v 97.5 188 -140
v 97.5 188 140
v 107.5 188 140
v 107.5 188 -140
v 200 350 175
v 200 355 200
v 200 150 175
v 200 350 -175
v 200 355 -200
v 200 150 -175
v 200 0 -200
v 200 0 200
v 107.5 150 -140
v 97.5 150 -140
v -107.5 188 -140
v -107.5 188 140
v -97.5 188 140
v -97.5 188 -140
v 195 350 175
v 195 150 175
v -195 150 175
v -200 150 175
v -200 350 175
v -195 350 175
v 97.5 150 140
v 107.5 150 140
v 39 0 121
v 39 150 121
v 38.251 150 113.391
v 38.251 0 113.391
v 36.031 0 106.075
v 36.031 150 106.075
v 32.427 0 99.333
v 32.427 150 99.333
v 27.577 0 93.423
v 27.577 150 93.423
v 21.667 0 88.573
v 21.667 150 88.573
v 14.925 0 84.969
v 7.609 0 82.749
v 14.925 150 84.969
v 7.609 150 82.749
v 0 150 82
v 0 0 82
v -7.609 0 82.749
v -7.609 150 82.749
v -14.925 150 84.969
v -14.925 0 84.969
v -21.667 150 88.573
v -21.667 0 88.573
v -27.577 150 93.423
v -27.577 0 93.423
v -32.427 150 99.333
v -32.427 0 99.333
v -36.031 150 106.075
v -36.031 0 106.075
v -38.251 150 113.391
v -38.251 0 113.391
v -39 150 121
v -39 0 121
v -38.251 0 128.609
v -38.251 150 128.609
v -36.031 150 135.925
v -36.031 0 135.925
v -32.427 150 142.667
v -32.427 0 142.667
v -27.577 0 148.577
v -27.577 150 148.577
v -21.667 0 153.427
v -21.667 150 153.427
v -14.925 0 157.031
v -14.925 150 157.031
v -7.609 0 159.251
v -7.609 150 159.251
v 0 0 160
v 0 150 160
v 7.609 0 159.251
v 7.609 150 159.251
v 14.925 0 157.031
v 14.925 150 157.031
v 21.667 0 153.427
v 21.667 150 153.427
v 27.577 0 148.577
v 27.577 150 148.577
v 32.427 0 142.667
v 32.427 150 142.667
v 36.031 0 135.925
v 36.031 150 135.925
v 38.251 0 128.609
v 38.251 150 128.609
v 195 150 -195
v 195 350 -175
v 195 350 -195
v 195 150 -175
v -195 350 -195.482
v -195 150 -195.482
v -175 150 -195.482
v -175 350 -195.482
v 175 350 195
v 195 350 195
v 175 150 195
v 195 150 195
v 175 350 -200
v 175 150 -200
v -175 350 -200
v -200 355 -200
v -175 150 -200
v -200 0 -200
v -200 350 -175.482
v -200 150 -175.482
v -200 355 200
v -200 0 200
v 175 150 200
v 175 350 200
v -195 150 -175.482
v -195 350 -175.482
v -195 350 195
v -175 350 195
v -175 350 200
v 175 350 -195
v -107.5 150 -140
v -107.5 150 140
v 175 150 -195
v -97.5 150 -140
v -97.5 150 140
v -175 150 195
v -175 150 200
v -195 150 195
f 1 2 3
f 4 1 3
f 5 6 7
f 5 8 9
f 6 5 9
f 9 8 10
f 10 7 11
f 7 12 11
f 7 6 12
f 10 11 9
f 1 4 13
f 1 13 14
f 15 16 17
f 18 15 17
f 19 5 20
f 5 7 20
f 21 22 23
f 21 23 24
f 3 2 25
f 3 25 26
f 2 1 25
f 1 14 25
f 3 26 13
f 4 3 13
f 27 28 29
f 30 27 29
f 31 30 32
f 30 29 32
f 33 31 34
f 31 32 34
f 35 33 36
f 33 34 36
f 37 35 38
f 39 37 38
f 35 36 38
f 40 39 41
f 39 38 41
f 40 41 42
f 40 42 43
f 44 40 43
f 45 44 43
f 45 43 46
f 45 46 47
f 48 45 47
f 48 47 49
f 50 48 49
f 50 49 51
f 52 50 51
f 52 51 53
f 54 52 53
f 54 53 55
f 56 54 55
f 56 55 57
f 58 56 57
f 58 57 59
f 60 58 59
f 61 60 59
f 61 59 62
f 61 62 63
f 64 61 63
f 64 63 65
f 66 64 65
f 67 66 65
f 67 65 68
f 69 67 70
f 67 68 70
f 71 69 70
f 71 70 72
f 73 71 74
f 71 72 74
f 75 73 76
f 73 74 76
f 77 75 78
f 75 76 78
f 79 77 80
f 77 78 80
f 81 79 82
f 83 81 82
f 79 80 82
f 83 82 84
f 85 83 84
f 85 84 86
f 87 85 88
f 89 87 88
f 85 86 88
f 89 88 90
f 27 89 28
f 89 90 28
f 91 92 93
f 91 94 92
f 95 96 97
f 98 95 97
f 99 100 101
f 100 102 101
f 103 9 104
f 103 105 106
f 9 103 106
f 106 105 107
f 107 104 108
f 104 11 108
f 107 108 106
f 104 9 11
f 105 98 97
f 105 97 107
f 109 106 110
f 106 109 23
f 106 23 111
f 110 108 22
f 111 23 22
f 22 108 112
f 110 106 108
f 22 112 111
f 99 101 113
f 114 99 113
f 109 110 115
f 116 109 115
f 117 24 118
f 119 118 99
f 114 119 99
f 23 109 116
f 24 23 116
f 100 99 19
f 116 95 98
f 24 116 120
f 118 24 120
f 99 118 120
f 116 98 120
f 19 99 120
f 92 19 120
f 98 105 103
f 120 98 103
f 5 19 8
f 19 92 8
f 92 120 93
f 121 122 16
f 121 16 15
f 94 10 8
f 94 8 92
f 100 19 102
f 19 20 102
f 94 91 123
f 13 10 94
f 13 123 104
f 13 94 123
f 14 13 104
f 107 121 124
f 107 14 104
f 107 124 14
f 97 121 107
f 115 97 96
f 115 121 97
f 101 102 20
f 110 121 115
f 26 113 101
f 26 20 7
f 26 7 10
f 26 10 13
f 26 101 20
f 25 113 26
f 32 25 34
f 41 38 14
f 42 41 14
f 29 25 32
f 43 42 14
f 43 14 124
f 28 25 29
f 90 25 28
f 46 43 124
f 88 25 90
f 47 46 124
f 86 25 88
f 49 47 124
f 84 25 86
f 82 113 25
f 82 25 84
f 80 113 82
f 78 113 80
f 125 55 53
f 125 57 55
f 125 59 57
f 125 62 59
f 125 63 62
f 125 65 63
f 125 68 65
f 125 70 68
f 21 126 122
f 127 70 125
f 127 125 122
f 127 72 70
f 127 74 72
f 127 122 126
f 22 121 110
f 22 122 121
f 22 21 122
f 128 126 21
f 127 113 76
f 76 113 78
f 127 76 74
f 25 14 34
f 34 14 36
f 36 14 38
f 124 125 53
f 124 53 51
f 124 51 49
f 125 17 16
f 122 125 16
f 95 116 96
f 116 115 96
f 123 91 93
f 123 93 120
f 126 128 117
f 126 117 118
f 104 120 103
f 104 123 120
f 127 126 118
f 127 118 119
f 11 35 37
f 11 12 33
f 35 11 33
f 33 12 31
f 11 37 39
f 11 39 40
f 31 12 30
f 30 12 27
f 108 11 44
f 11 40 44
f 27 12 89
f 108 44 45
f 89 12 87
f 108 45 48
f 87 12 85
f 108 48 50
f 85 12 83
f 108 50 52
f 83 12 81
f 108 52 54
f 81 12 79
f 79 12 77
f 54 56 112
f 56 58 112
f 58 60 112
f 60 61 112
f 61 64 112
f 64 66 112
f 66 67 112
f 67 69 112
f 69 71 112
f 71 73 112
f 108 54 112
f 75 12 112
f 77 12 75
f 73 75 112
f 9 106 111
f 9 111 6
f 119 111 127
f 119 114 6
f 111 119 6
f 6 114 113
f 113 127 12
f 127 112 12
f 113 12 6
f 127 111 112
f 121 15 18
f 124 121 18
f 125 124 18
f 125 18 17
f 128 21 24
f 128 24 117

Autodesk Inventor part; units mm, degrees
ref_plane "YZ Plane" through (0, 0, 0) normal (1, 0, 0) x (0, 1, 0)
ref_plane "XZ Plane" through (0, 0, 0) normal (0, 1, 0) x (-1, 0, 0)
ref_plane "XY Plane" through (0, 0, 0) normal (0, 0, 1) x (1, 0, 0)
sketch "Boceto1" plane through (0, 0, 0) normal (0, 1, 0) x (-1, 0, 0)
  line L0 (200, 200) -> (-200, 200)
  line L1 (-200, 200) -> (-200, -200)
  line L2 (-200, -200) -> (200, -200)
  line L3 (200, -200) -> (200, 200)
  point P0 (0, 0)
  dimension "d0" = 400
  dimension "L" = 400
  dimension "d2" = 200
  dimension "d3" = 200
extrude "Extrusión1" add sketch "Boceto1" along normal blind 150
sketch "Boceto3" plane through (0, 150, 0) normal (0, 1, 0) x (1, 0, 0)
  circle A0 centre (0, -121) radius 39
  line L0 (200, 200) -> (-200, 200) projected
  line L1 (-200, -200) -> (200, -200) projected
  point P0 (0, 0)
  dimension "D" = 78
  dimension "d27" = 79
extrude "Extrusión2" cut sketch "Boceto3" against normal blind 153.75
ref_plane "Plano de trabajo1" through (0, 0, 200) normal (1, 0, 0) x (0, 0, -1)
ref_plane "Plano de trabajo2" through (-200, 0, 0) normal (0, 0, 1) x (1, 0, 0)
sketch "Boceto4" plane through (0, 150, 0) normal (0, 1, 0) x (1, 0, 0)
  line L0 (-97.5, 140) -> (-97.5, -140)
  line L1 (97.5, 140) -> (97.5, -140)
  line L2 (200, 200) -> (-200, 200) projected
  circle A0 centre (0, -121) radius 39 projected
  line L3 (-200, -200) -> (200, -200) projected
  line L4 (-97.5, -140) -> (-107.5, -140)
  line L5 (-107.5, -140) -> (-107.5, 140)
  line L6 (-107.5, 140) -> (-97.5, 140)
  line L7 (-97.5, 140) -> (-97.5, -140)
  line L8 (97.5, -140) -> (107.5, -140)
  line L9 (107.5, -140) -> (107.5, 140)
  line L10 (107.5, 140) -> (97.5, 140)
  line L11 (97.5, 140) -> (97.5, -140)
  point P0 (0, 0)
  dimension "Lriel" = 280
  dimension "d13" = 60
  dimension "d14" = 280
  dimension "d15" = 60
  dimension "d19" = 10
  dimension "d20" = 280
  dimension "d21" = 97.5
  dimension "d22" = 10
  dimension "d23" = 280
  dimension "d24" = 97.5
extrude "Extrusión3" add sketch "Boceto4" along normal blind 38 contours L0 L4 L5 L6 | L10 L9 L8 L1
sketch "Boceto5" plane through (0, 150, 0) normal (0, 1, 0) x (1, 0, 0)
  line L0 (-200, 200) -> (-200, -200) projected
  line L1 (-200, 200) -> (-200, 175)
  line L2 (-200, 175.482) -> (-195, 175.482)
  line L3 (-195, 175.482) -> (-195, 195.482)
  line L4 (-195, 195.482) -> (-175, 195.482)
  line L5 (-175, 195.482) -> (-175, 200)
  line L6 (200, 200) -> (-200, 200) projected
  line L7 (-200, 200) -> (-175, 200)
  line L8 (-200, -200) -> (-200, -175)
  line L9 (-200, -175) -> (-195, -175)
  line L10 (-195, -175) -> (-195, -195)
  line L11 (-195, -195) -> (-175, -195)
  line L12 (-175, -195) -> (-175, -200)
  line L13 (-200, -200) -> (200, -200) projected
  line L14 (-175, -200) -> (-200, -200)
  line L15 (200, -200) -> (200, 200) projected
  line L16 (200, -200) -> (200, -175)
  line L17 (200, -175) -> (195, -175)
  line L18 (195, -175) -> (195, -195)
  line L19 (195, -195) -> (175, -195)
  line L20 (175, -195) -> (175, -200)
  line L21 (200, -200) -> (175, -200)
  line L22 (200, 200) -> (200, 175)
  line L23 (200, 175) -> (195, 175)
  line L24 (195, 175) -> (195, 195)
  line L25 (195, 195) -> (175, 195)
  line L26 (175, 195) -> (175, 200)
  line L27 (200, 200) -> (175, 200)
  point P0 (0, 0)
  dimension "d28" = 25
  dimension "d29" = 5
  dimension "d30" = 20
  dimension "d31" = 20
  dimension "d32" = 25
  dimension "d33" = 5
  dimension "d34" = 20
  dimension "d35" = 20
  dimension "d36" = 25
  dimension "d37" = 5
  dimension "d38" = 20
  dimension "d39" = 20
  dimension "d40" = 25
  dimension "d41" = 5
  dimension "d42" = 20
  dimension "d43" = 20
extrude "Extrusión4" add sketch "Boceto5" along normal blind 200 contours L6 L5 L4 L3 L2 L0 | L6 L15 L23 L24 L25 L26 | L9 L10 L11 L12 L13 L0 | L15 L13 L20 L19 L18 L17
sketch "Boceto6" plane through (0, 350, 0) normal (0, 1, 0) x (1, 0, 0)
  line L0 (-200, 200) -> (-200, -200) projected
  line L1 (-200, -200) -> (200, -200)
  line L2 (200, -200) -> (200, 200)
  line L3 (200, 200) -> (-200, 200)
  line L4 (-200, 200) -> (-200, -200)
  point P0 (0, 0)
extrude "Extrusión5" add sketch "Boceto6" along normal blind 5
equation "\"d0\" = L"
equation "\"d2\" = 0.5 * L"
equation "\"d3\" = 0.5 * L"
equation "\"d14\" = Lriel"
properties part number "CajaBoya"
